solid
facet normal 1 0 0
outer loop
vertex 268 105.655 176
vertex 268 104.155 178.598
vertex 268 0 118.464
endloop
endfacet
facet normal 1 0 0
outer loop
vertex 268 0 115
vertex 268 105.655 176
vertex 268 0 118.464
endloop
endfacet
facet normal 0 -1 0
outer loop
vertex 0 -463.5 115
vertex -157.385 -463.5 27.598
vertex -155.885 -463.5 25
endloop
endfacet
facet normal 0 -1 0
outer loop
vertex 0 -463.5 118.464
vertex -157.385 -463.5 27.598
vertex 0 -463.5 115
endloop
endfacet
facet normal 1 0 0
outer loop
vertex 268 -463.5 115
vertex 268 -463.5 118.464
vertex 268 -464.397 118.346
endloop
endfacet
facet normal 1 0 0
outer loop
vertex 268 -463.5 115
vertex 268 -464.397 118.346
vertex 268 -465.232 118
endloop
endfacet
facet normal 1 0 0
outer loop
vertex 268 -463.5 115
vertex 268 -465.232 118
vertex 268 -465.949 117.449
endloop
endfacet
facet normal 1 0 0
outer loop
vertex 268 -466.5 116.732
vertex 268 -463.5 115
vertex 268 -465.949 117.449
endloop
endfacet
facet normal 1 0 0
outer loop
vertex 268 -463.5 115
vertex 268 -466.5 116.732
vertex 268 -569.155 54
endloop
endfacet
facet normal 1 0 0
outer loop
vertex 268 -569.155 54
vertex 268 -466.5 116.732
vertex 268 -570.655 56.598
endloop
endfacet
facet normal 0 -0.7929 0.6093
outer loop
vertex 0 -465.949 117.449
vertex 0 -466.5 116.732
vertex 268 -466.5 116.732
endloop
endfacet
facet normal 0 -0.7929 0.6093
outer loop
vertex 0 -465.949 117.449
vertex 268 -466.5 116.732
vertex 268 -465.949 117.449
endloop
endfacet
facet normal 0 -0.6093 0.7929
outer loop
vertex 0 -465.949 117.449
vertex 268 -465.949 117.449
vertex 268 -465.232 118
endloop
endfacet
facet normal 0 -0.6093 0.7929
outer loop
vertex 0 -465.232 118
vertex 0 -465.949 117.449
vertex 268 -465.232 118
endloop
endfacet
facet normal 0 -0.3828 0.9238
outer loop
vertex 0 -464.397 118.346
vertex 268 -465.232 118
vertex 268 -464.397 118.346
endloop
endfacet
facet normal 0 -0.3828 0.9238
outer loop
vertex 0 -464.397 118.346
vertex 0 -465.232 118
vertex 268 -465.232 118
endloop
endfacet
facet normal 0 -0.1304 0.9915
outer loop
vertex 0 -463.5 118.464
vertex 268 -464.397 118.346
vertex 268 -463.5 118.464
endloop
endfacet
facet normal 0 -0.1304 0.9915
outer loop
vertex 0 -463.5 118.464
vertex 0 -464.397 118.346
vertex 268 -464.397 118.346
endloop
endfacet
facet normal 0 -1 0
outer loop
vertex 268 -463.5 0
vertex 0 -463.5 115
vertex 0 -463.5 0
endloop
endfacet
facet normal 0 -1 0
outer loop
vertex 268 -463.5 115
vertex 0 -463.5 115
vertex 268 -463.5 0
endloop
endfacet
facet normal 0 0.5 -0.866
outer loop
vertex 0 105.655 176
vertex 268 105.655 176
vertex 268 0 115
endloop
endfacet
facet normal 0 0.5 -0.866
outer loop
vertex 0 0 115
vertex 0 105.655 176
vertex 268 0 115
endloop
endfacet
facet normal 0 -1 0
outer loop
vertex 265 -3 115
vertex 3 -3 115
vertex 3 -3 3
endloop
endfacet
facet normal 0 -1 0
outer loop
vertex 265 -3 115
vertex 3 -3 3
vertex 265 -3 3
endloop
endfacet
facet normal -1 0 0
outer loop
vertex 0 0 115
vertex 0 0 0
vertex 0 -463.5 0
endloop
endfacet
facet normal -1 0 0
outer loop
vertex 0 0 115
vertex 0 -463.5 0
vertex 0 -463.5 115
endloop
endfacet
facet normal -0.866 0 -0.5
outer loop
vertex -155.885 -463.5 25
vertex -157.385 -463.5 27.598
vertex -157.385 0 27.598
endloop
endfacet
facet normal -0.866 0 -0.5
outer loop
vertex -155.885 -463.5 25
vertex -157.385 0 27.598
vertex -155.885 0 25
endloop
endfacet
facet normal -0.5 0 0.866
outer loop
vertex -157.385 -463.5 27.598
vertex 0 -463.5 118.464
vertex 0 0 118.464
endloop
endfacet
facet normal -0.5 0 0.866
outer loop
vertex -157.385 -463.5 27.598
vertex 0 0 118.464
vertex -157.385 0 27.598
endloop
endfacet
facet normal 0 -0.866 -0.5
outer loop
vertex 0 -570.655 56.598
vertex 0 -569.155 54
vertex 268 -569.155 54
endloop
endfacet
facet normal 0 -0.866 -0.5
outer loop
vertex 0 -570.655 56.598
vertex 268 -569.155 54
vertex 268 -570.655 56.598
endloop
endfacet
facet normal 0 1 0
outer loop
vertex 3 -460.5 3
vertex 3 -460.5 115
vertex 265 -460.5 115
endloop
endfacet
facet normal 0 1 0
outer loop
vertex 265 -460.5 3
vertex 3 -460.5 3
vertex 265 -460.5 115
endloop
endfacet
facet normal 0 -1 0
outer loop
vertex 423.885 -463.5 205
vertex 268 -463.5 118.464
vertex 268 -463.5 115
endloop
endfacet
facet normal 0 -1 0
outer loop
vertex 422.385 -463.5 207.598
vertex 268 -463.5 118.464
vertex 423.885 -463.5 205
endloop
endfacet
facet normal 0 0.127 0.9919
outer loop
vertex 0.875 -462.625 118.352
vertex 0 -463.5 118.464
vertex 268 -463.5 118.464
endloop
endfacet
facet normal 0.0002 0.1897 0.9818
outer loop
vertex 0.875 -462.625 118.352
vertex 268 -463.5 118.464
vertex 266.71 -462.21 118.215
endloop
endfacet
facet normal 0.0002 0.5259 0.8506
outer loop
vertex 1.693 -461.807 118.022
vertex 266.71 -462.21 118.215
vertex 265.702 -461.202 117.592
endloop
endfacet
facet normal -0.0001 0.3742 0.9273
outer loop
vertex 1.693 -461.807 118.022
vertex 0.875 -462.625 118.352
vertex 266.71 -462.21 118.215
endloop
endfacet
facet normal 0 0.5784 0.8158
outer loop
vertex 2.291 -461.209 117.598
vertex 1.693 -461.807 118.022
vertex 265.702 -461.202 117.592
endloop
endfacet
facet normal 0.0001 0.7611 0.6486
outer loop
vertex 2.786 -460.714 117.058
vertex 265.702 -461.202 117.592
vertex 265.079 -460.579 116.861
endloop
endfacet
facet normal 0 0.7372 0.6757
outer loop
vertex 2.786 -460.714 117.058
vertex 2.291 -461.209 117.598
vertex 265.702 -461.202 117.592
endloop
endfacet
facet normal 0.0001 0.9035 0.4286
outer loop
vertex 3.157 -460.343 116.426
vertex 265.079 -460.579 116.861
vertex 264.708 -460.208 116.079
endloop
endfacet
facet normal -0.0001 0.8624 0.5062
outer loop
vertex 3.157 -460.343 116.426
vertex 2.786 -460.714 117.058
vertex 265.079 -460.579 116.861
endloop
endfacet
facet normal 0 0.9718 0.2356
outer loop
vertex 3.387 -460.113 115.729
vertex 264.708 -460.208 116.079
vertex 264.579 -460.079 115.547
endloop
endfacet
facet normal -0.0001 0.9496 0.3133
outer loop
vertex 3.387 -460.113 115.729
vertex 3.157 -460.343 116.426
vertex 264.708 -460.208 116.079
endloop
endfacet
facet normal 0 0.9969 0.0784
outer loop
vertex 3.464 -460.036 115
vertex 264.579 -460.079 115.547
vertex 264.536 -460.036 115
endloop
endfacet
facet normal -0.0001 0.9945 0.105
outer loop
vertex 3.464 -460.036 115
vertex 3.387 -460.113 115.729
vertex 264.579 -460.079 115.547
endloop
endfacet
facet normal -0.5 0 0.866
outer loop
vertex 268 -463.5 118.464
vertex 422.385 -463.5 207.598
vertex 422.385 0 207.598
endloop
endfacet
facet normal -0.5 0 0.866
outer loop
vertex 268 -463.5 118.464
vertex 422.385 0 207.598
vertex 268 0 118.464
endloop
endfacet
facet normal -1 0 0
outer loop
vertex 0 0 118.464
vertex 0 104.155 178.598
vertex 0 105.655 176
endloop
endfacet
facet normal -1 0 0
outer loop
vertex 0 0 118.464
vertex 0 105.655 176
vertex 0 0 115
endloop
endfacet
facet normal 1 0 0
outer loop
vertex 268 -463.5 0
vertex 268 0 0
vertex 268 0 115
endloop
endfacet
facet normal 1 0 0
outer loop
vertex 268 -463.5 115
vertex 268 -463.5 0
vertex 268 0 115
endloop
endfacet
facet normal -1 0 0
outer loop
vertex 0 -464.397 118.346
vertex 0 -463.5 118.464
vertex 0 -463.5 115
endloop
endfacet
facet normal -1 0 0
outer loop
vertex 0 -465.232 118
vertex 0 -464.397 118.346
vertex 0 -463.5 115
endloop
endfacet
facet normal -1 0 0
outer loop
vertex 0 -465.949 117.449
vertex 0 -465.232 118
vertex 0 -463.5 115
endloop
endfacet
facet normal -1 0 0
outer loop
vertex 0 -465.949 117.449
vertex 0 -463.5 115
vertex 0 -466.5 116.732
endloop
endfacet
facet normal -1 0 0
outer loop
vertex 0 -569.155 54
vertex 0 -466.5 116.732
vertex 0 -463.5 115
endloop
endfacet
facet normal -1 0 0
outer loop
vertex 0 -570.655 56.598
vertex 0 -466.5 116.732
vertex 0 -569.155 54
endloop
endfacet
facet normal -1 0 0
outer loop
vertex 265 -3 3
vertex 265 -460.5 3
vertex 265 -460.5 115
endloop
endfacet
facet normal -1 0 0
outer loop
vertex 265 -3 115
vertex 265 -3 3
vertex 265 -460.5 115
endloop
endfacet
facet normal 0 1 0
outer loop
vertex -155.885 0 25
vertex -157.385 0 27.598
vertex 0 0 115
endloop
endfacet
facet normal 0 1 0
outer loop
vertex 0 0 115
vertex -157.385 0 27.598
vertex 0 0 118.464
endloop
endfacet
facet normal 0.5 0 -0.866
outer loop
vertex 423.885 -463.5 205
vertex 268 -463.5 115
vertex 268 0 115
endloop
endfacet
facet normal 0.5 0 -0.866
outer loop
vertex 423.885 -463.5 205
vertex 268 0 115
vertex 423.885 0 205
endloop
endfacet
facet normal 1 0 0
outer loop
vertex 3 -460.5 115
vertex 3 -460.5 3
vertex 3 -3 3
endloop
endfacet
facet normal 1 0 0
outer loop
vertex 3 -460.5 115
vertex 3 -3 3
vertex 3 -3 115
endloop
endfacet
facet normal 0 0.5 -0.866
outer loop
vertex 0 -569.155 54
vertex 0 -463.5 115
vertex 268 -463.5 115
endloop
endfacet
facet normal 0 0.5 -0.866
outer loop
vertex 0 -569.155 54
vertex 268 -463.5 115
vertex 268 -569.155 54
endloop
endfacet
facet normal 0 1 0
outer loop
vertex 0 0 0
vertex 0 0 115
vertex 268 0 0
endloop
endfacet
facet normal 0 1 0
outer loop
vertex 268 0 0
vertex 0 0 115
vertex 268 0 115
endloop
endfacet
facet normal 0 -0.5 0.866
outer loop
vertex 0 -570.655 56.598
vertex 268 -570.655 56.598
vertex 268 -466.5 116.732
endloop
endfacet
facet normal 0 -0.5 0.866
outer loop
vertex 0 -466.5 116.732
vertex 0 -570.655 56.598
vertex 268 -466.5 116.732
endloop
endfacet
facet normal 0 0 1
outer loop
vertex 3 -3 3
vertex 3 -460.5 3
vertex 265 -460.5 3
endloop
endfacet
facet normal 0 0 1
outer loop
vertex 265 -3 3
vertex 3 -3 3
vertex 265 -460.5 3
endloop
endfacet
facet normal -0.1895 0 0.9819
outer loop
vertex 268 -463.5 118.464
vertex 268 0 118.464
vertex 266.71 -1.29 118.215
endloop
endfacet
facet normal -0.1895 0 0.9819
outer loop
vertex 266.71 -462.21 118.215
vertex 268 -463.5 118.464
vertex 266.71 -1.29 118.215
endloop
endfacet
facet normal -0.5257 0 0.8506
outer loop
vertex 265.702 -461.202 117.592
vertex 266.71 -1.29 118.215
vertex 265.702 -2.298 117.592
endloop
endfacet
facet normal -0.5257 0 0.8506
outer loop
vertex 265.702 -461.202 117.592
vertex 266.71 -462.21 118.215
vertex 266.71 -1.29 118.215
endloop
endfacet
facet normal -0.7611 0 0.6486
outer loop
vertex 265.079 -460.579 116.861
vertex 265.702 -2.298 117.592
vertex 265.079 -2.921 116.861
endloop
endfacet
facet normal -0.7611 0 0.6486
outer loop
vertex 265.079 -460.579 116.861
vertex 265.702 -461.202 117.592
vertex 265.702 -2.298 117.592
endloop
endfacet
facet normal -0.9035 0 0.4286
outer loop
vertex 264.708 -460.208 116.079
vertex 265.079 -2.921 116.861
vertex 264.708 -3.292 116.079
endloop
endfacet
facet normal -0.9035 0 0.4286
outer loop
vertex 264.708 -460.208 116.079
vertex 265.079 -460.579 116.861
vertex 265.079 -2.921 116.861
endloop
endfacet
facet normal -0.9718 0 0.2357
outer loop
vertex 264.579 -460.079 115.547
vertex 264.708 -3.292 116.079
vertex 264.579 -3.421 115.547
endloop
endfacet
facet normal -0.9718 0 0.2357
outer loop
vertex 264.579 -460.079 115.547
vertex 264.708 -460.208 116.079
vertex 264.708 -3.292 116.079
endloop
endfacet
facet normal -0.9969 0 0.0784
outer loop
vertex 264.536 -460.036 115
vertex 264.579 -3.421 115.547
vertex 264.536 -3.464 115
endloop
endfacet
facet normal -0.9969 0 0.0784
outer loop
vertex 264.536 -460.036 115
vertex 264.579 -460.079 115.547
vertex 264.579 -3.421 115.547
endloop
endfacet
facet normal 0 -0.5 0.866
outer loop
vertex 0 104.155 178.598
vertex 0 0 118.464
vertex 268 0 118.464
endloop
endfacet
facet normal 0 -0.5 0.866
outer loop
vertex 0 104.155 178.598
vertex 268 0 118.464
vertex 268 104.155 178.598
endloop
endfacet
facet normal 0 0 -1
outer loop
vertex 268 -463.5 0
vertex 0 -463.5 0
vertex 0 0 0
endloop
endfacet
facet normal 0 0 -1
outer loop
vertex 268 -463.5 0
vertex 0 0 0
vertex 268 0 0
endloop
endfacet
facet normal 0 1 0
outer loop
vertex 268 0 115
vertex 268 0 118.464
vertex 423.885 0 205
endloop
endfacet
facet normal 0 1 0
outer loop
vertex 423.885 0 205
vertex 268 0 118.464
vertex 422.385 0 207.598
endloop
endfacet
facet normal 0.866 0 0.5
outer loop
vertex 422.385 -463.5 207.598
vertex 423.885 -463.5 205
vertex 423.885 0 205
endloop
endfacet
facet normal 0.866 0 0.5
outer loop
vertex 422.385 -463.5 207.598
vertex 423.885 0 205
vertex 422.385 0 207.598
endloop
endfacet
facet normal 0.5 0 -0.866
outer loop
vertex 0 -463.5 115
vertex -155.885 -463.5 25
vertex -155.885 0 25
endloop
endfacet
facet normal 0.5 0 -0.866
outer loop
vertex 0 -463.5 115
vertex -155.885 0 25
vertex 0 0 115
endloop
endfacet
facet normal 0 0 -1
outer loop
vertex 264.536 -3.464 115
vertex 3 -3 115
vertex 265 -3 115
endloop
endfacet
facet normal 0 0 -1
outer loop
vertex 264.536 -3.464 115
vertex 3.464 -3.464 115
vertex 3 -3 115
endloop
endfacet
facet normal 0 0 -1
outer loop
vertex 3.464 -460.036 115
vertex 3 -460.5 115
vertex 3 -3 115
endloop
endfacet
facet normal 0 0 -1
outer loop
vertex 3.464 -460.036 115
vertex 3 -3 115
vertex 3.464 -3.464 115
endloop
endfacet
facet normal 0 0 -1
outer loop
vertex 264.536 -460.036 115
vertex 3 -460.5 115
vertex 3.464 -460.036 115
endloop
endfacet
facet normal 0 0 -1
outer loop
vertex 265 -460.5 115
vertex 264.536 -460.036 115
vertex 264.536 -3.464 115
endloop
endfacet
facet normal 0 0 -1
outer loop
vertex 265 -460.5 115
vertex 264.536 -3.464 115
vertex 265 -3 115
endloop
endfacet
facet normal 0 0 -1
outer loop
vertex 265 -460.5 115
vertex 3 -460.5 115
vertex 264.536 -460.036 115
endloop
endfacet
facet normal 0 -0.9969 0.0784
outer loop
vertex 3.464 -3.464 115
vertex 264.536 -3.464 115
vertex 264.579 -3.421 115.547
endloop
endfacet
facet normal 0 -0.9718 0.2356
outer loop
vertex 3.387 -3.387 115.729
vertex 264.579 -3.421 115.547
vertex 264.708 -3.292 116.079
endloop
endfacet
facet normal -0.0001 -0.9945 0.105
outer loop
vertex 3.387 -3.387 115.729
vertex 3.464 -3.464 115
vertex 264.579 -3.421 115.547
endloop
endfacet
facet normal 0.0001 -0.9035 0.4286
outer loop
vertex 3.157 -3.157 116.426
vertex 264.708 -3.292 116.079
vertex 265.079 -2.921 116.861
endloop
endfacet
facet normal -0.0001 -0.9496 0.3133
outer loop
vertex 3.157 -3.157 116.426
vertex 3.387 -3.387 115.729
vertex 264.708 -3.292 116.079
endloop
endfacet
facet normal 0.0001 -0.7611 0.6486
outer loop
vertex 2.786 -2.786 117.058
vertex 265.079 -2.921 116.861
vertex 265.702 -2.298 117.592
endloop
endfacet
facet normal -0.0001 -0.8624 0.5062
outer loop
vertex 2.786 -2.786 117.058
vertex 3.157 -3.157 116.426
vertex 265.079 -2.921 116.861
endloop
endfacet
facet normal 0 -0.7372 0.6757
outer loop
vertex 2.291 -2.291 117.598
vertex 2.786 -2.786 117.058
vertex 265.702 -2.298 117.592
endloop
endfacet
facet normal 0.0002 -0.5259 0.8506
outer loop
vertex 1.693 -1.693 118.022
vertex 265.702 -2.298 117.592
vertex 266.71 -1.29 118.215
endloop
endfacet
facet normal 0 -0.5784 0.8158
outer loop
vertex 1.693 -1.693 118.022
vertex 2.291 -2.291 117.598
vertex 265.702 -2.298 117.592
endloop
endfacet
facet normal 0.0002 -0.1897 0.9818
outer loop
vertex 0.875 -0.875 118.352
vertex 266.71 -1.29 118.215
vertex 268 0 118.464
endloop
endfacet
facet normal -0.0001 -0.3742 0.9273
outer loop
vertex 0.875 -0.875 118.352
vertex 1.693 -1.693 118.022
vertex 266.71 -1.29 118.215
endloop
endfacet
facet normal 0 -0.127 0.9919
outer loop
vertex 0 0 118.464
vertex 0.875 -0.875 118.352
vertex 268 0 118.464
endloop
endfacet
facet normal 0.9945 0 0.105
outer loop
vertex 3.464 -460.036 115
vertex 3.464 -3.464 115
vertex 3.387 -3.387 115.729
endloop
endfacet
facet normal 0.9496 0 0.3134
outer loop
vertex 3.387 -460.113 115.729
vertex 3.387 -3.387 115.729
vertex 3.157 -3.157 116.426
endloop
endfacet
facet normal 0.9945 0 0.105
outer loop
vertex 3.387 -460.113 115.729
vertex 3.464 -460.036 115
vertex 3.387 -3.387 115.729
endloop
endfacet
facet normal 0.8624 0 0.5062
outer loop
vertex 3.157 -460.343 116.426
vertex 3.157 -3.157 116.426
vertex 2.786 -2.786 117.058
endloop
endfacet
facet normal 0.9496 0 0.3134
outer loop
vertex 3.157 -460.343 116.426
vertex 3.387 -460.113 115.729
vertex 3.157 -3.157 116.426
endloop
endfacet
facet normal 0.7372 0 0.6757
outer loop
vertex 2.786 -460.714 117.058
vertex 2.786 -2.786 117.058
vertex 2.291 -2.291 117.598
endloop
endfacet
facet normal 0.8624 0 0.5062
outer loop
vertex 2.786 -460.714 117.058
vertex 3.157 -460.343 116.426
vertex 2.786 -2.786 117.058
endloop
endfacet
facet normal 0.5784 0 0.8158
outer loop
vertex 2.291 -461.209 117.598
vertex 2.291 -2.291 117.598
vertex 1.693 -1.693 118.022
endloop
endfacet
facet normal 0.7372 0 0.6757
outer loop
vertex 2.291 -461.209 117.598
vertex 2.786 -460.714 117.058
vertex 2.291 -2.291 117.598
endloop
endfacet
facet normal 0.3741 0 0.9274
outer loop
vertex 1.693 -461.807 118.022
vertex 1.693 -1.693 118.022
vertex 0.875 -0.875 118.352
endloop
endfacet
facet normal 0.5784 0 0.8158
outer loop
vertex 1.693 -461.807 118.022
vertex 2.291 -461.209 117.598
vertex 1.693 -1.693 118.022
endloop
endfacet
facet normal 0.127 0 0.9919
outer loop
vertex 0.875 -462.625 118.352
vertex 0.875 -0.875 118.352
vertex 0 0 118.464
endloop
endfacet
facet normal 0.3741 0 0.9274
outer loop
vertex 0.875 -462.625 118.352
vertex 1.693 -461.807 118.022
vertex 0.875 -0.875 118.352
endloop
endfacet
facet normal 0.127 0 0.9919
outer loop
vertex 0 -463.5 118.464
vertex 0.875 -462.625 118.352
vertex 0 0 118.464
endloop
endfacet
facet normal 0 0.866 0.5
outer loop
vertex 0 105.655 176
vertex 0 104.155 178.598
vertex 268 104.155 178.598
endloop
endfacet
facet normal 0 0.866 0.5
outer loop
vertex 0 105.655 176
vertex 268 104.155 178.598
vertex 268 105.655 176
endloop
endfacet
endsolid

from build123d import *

# Parameters (mm, degrees)
F0_W     = 268
F0_H     = 115
F1_DEPTH = 463.5
F2_T     = -3
F4_DEPTH = 463.5
F6_DEPTH = 268


with BuildPart() as f1:
    # F0 (on Front) → F1 (new body)
    with BuildSketch(Plane.XZ):
        with Locations((134, 57.5)):
            Rectangle(F0_W, F0_H)
    extrude(amount=F1_DEPTH)

    # F2
    f2_openings = [f1.faces().sort_by_distance(p)[0] for p in [
        (134, -231.75, 115),
    ]]
    offset(amount=F2_T, openings=f2_openings)

    # F3 (on face) → F4 (join, through all)
    with BuildSketch(Plane.XZ.offset(463.5)):
        with BuildLine():
            Line((-155.884573, 25), (0, 115))
            Line((0, 115), (3.464102, 115))
            ThreePointArc((3.464102, 115), (2.44949, 117.44949), (0, 118.464102))
            Line((0, 118.464102), (-157.384573, 27.598076))
            Line((-157.384573, 27.598076), (-155.884573, 25))
        make_face()
        with BuildLine():
            Line((264.535898, 115), (268, 115))
            Line((268, 115), (423.884573, 205))
            Line((423.884573, 205), (422.384573, 207.598076))
            Line((422.384573, 207.598076), (268, 118.464102))
            ThreePointArc((268, 118.464102), (265.55051, 117.44949), (264.535898, 115))
        make_face()
    extrude(amount=-F4_DEPTH)

    # F5 (on face) → F6 (join, through all)
    with BuildSketch(Plane(origin=(0, 0, 0), x_dir=(0, -1, 0), z_dir=(-1, 0, 0))):
        with BuildLine():
            Line((460.035898, 115), (463.5, 115))
            Line((463.5, 115), (569.155099, 54))
            Line((569.155099, 54), (570.655099, 56.598076))
            Line((570.655099, 56.598076), (466.5, 116.732051))
            ThreePointArc((466.5, 116.732051), (465.232051, 118), (463.5, 118.464102))
            ThreePointArc((463.5, 118.464102), (461.05051, 117.44949), (460.035898, 115))
        make_face()
        with BuildLine():
            Line((-105.655099, 176), (0, 115))
            Line((0, 115), (3.464102, 115))
            ThreePointArc((3.464102, 115), (2.44949, 117.44949), (0, 118.464102))
            Line((0, 118.464102), (-104.155099, 178.598076))
            Line((-104.155099, 178.598076), (-105.655099, 176))
        make_face()
    extrude(amount=-F6_DEPTH)


solid = f1.part
